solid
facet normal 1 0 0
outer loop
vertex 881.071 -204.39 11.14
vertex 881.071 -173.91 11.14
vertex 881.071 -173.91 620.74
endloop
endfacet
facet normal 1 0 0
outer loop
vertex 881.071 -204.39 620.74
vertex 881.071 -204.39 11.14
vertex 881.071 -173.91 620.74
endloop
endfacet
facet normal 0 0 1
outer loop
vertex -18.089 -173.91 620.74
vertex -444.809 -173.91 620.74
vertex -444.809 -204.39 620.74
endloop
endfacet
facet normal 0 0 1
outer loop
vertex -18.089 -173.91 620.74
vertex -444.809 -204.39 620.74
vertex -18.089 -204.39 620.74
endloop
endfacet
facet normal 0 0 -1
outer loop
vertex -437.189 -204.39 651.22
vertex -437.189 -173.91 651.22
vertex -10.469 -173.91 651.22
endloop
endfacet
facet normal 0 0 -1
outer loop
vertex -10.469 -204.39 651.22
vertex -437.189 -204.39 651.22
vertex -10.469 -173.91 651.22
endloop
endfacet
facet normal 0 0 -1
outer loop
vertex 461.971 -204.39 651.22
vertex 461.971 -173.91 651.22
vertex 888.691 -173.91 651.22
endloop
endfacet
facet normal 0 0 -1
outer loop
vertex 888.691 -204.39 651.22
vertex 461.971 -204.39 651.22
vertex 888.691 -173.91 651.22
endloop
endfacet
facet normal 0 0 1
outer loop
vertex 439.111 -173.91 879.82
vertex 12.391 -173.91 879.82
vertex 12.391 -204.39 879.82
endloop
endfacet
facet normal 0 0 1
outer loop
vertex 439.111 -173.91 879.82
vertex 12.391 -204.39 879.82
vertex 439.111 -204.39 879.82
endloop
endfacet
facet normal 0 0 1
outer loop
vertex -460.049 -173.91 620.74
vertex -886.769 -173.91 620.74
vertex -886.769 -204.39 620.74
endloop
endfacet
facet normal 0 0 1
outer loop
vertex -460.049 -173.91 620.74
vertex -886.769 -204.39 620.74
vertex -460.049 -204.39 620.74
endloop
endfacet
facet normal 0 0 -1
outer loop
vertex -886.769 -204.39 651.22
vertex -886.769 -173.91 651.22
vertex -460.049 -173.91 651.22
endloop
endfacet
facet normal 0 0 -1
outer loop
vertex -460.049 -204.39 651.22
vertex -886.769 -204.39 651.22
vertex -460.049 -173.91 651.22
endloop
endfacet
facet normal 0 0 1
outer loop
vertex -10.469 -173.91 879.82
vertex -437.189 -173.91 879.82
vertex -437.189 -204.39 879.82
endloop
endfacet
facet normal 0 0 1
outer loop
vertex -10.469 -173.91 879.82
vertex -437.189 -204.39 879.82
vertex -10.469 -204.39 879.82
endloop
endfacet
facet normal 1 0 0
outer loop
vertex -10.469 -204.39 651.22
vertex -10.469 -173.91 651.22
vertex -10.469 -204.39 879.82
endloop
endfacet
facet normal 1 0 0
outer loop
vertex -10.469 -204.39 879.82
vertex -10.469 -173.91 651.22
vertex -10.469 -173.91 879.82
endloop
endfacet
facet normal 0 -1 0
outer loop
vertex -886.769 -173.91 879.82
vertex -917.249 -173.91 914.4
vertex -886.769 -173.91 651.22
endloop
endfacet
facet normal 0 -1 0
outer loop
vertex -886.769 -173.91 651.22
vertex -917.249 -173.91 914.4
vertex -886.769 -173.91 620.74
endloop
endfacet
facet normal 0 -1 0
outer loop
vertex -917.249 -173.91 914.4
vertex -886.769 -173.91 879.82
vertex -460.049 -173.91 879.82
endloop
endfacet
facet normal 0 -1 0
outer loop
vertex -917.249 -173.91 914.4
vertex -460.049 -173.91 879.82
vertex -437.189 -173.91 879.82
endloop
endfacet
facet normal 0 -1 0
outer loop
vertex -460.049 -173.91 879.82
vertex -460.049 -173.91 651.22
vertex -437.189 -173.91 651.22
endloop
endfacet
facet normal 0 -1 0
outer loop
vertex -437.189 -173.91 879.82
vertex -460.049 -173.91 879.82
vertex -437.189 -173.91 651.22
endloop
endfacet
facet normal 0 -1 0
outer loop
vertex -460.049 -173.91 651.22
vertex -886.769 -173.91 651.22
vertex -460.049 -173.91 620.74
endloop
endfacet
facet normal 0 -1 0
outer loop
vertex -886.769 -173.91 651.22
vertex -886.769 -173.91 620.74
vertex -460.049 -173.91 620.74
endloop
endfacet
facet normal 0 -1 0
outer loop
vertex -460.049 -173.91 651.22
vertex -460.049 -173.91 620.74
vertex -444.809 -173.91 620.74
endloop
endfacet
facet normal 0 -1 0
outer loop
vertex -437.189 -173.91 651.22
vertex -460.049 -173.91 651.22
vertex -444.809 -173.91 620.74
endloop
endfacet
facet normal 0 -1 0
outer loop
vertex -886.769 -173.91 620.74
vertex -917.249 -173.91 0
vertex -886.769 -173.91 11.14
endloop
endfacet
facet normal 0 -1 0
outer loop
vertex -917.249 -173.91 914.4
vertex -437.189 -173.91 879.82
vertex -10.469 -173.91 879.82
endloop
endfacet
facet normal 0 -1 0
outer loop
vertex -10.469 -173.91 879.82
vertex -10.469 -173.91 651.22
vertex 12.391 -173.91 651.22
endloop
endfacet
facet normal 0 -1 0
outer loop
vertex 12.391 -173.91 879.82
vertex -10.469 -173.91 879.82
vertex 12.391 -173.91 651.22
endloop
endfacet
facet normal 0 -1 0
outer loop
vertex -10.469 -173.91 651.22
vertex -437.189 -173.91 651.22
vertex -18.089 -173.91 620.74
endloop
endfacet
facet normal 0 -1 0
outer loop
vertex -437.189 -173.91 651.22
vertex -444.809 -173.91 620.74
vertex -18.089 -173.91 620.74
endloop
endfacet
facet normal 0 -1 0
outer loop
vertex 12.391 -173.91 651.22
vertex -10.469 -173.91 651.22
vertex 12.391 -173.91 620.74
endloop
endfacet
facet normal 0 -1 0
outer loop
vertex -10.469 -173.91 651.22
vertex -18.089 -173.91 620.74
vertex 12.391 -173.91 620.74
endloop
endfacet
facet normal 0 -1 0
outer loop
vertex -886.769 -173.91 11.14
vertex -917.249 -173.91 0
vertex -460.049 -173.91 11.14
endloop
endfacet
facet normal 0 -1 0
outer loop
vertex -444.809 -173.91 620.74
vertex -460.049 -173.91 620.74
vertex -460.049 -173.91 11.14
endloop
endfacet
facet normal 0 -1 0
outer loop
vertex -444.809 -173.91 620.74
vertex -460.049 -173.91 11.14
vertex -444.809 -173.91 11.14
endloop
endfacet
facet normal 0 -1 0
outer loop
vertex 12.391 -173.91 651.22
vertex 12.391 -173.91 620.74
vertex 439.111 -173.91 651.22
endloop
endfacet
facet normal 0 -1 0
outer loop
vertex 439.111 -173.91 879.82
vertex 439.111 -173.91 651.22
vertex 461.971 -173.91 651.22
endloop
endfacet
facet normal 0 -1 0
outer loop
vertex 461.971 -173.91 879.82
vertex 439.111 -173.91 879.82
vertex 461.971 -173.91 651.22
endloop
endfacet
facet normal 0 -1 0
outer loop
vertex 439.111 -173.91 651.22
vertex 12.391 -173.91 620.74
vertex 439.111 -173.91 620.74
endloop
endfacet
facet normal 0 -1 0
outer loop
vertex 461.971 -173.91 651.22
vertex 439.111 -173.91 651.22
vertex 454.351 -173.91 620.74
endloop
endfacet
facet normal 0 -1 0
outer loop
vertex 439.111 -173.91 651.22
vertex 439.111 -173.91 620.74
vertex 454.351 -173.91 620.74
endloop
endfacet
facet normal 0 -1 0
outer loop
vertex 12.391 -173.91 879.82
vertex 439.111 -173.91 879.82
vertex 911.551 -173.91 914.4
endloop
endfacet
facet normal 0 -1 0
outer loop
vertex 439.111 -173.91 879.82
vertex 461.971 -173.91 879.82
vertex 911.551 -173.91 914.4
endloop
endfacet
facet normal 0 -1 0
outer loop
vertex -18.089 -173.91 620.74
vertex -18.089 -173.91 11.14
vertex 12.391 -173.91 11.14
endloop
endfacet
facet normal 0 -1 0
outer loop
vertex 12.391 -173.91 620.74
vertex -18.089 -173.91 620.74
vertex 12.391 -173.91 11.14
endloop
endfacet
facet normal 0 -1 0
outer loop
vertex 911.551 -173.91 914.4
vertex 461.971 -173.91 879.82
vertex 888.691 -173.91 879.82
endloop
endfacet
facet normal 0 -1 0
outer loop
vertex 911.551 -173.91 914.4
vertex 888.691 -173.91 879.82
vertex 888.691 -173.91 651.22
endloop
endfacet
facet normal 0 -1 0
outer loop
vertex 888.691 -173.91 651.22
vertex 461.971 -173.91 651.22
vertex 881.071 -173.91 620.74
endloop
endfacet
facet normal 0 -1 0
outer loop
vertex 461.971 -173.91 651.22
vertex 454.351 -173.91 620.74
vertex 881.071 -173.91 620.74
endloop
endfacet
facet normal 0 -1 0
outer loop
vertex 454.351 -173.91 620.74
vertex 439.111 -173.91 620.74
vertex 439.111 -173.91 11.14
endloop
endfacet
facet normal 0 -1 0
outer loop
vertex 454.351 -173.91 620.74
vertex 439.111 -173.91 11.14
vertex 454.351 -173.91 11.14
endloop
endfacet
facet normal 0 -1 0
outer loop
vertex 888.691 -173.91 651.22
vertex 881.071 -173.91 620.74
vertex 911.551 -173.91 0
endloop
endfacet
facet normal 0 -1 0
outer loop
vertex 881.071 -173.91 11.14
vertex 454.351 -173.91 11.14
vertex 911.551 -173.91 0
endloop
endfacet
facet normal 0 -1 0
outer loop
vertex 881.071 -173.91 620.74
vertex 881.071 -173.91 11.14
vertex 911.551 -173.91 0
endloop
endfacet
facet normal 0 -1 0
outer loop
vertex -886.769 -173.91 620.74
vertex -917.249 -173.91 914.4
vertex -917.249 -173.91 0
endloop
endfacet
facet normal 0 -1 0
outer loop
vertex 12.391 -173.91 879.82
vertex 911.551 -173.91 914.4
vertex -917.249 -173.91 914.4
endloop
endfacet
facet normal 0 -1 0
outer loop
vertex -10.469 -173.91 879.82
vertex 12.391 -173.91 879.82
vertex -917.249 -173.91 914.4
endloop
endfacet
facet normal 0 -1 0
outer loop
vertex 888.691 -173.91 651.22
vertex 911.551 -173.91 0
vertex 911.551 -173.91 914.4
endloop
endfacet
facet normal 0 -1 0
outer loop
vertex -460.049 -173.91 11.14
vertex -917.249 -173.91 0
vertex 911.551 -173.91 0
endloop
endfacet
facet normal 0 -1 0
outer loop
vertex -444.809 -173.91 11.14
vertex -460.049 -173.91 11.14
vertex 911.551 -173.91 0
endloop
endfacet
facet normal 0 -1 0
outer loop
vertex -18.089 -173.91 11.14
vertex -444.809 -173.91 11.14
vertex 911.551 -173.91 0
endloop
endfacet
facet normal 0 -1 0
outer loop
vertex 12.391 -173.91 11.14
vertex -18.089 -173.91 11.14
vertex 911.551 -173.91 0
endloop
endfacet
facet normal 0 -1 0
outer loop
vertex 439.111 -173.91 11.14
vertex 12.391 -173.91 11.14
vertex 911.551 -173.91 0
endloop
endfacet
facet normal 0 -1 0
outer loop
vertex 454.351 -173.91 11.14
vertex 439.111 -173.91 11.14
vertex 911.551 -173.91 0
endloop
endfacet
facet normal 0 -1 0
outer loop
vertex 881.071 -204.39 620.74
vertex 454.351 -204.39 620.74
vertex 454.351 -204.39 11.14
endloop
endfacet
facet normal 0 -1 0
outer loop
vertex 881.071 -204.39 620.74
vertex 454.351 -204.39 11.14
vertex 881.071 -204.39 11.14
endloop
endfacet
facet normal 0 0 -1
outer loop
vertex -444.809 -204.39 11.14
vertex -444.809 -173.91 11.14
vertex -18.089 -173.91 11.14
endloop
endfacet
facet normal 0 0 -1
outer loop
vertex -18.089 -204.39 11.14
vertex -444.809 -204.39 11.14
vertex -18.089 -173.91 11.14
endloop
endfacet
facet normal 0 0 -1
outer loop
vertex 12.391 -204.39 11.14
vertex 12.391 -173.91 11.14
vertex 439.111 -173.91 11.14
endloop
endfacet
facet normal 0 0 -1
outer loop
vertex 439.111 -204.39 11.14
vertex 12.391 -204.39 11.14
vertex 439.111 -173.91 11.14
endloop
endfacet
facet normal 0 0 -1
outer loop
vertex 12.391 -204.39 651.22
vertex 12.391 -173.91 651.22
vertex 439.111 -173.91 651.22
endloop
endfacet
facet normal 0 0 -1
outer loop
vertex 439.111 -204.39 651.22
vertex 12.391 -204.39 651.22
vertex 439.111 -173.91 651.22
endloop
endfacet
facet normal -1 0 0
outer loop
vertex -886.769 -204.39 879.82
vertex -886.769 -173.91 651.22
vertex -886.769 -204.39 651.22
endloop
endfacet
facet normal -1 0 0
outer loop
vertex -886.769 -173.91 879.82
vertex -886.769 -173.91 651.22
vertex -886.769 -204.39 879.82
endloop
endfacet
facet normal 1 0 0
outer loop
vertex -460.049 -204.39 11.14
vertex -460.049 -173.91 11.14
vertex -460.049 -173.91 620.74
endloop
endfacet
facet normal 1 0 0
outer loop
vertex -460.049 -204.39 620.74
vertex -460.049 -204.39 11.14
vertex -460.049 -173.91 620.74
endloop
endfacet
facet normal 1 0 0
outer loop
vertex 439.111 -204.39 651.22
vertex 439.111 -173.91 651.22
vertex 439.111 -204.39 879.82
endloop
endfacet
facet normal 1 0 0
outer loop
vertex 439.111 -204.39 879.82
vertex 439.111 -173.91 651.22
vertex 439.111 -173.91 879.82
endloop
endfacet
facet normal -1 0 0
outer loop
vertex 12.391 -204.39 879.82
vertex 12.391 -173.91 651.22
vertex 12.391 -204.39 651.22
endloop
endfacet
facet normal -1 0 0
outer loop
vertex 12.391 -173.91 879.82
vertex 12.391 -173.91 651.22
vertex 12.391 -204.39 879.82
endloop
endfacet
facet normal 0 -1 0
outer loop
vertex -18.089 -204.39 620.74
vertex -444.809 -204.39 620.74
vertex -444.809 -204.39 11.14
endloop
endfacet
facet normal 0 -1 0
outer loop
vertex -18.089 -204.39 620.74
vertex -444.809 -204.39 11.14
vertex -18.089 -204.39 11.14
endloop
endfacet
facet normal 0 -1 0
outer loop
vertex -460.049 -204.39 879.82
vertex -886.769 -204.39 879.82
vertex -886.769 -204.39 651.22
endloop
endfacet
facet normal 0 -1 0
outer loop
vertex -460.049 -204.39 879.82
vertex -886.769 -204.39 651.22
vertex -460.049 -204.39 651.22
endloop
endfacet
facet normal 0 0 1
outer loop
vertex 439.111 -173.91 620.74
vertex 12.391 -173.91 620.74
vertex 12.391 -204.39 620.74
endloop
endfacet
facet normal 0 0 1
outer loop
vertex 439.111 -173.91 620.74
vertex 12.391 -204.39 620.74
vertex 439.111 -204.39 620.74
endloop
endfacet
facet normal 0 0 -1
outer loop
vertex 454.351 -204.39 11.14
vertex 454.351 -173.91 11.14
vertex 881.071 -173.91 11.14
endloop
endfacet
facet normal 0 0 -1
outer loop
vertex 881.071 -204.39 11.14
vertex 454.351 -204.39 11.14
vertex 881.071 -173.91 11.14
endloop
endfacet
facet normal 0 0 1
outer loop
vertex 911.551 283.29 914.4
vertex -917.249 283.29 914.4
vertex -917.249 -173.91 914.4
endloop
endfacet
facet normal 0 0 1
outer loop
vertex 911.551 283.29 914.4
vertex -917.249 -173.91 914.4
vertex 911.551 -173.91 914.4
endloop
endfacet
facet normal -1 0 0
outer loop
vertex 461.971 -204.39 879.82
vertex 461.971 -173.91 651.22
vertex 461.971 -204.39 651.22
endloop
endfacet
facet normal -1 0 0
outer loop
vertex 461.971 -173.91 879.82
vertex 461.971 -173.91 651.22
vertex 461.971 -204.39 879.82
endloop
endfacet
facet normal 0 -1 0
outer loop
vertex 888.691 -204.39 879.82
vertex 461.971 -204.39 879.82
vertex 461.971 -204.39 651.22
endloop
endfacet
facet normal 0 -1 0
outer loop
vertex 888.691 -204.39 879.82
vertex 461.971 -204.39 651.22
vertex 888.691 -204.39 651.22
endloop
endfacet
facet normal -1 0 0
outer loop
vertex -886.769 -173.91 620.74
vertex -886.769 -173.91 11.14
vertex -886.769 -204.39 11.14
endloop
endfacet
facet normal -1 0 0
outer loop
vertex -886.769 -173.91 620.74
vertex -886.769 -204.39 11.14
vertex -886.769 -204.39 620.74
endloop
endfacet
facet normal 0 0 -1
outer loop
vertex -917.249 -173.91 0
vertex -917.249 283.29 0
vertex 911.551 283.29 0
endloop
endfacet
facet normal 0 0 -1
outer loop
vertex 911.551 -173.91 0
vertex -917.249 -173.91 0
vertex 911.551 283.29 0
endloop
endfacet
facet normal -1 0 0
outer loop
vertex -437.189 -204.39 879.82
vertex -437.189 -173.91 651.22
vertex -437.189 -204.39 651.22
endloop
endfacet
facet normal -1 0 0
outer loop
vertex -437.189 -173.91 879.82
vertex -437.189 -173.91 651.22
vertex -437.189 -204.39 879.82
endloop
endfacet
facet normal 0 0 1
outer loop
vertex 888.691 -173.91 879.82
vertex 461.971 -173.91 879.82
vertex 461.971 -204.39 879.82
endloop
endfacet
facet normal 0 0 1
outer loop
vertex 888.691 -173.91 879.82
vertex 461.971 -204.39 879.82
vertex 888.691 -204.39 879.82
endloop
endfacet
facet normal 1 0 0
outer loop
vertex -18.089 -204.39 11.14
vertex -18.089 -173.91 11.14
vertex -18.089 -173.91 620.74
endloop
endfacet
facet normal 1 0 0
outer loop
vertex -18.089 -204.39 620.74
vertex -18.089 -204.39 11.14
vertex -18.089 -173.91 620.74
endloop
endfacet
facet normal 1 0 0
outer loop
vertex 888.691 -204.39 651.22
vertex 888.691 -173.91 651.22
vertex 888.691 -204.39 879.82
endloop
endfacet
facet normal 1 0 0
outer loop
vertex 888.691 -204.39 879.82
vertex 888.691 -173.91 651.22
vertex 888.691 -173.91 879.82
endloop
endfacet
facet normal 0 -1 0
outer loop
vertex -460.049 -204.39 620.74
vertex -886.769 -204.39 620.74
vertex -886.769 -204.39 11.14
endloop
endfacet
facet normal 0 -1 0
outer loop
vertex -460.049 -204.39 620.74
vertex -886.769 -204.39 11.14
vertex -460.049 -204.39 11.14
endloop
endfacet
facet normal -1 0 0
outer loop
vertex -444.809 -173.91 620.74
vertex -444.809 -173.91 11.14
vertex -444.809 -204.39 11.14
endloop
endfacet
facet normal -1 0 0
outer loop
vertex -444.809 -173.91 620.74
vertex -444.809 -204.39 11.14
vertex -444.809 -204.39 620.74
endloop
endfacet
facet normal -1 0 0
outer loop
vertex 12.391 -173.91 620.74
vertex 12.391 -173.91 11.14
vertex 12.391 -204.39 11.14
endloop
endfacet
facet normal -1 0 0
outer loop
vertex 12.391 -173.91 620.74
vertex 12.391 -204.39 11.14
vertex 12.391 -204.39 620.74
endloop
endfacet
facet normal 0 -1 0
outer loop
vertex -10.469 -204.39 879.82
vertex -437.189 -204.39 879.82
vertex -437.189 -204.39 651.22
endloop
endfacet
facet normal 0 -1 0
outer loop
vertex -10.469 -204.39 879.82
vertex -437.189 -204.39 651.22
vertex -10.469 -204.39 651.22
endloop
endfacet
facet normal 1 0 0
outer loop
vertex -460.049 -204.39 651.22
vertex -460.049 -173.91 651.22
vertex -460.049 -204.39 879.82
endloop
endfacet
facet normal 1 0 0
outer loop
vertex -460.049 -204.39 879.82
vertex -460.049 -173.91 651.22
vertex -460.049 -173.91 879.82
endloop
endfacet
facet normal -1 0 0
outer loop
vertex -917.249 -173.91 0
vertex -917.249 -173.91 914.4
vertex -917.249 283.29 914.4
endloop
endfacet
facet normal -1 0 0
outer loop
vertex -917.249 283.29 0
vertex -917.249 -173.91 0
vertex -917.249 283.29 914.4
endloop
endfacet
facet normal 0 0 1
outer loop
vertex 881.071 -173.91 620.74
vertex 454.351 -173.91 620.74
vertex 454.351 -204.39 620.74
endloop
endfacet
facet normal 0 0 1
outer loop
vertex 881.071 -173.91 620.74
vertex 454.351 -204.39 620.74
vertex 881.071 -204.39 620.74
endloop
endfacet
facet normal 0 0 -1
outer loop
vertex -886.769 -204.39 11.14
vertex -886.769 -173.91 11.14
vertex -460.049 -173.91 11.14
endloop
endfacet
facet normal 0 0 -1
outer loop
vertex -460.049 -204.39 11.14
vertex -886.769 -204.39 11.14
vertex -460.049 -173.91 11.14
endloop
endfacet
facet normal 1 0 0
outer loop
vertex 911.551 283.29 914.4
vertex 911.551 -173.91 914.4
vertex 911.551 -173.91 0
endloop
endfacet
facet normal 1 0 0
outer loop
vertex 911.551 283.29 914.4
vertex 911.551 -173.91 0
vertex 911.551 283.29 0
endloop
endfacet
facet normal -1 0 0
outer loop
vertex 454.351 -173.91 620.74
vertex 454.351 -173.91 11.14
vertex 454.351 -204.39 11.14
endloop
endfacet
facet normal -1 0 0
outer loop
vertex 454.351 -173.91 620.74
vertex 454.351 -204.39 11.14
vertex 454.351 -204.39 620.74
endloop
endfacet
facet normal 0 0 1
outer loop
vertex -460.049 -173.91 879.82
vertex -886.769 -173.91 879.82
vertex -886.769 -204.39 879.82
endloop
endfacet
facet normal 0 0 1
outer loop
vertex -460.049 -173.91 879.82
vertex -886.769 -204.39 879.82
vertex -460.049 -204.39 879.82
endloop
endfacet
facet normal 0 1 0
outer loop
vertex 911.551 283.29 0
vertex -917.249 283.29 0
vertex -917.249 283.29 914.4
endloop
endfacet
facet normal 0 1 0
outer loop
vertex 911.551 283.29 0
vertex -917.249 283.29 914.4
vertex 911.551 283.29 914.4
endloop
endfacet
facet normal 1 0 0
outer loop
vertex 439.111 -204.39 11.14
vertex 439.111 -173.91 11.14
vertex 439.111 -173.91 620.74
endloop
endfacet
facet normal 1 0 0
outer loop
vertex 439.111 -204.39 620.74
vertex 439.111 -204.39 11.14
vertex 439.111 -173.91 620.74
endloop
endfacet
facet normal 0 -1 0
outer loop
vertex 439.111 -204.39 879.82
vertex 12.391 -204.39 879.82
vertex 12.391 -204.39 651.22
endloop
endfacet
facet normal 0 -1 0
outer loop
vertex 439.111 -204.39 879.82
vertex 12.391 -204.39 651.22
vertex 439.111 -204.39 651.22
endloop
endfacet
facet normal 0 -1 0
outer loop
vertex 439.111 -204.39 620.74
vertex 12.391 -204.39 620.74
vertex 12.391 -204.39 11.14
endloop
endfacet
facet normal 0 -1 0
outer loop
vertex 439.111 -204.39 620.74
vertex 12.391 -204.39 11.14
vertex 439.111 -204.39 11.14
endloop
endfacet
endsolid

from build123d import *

# Parameters (mm, degrees)
F0_W     = 1828.8
F0_H     = 457.2
F1_DEPTH = 914.4
F2_W     = 426.72
F2_H     = 609.6
F2_H_2   = 228.6
F3_DEPTH = 30.48


with BuildPart() as f1:
    # F0 (on Top) → F1 (new body)
    with BuildSketch(Plane.XY):
        with Locations((-2.849022, 54.689566)):
            Rectangle(F0_W, F0_H)
    extrude(amount=F1_DEPTH)

    # F2 (on face) → F3 (join)
    with BuildSketch(Plane.XZ.offset(173.910434)):
        with Locations((-673.409022, 315.940248)):
            Rectangle(F2_W, F2_H)
        with Locations((-231.449022, 315.940248)):
            Rectangle(F2_W, F2_H)
        with Locations((225.750978, 315.940248)):
            Rectangle(F2_W, F2_H)
        with Locations((667.710978, 315.940248)):
            Rectangle(F2_W, F2_H)
        with Locations((-673.409022, 765.520248)):
            Rectangle(F2_W, F2_H_2)
        with Locations((-223.829022, 765.520248)):
            Rectangle(F2_W, F2_H_2)
        with Locations((225.750978, 765.520248)):
            Rectangle(F2_W, F2_H_2)
        with Locations((675.330978, 765.520248)):
            Rectangle(F2_W, F2_H_2)
    extrude(amount=F3_DEPTH)


solid = f1.part
